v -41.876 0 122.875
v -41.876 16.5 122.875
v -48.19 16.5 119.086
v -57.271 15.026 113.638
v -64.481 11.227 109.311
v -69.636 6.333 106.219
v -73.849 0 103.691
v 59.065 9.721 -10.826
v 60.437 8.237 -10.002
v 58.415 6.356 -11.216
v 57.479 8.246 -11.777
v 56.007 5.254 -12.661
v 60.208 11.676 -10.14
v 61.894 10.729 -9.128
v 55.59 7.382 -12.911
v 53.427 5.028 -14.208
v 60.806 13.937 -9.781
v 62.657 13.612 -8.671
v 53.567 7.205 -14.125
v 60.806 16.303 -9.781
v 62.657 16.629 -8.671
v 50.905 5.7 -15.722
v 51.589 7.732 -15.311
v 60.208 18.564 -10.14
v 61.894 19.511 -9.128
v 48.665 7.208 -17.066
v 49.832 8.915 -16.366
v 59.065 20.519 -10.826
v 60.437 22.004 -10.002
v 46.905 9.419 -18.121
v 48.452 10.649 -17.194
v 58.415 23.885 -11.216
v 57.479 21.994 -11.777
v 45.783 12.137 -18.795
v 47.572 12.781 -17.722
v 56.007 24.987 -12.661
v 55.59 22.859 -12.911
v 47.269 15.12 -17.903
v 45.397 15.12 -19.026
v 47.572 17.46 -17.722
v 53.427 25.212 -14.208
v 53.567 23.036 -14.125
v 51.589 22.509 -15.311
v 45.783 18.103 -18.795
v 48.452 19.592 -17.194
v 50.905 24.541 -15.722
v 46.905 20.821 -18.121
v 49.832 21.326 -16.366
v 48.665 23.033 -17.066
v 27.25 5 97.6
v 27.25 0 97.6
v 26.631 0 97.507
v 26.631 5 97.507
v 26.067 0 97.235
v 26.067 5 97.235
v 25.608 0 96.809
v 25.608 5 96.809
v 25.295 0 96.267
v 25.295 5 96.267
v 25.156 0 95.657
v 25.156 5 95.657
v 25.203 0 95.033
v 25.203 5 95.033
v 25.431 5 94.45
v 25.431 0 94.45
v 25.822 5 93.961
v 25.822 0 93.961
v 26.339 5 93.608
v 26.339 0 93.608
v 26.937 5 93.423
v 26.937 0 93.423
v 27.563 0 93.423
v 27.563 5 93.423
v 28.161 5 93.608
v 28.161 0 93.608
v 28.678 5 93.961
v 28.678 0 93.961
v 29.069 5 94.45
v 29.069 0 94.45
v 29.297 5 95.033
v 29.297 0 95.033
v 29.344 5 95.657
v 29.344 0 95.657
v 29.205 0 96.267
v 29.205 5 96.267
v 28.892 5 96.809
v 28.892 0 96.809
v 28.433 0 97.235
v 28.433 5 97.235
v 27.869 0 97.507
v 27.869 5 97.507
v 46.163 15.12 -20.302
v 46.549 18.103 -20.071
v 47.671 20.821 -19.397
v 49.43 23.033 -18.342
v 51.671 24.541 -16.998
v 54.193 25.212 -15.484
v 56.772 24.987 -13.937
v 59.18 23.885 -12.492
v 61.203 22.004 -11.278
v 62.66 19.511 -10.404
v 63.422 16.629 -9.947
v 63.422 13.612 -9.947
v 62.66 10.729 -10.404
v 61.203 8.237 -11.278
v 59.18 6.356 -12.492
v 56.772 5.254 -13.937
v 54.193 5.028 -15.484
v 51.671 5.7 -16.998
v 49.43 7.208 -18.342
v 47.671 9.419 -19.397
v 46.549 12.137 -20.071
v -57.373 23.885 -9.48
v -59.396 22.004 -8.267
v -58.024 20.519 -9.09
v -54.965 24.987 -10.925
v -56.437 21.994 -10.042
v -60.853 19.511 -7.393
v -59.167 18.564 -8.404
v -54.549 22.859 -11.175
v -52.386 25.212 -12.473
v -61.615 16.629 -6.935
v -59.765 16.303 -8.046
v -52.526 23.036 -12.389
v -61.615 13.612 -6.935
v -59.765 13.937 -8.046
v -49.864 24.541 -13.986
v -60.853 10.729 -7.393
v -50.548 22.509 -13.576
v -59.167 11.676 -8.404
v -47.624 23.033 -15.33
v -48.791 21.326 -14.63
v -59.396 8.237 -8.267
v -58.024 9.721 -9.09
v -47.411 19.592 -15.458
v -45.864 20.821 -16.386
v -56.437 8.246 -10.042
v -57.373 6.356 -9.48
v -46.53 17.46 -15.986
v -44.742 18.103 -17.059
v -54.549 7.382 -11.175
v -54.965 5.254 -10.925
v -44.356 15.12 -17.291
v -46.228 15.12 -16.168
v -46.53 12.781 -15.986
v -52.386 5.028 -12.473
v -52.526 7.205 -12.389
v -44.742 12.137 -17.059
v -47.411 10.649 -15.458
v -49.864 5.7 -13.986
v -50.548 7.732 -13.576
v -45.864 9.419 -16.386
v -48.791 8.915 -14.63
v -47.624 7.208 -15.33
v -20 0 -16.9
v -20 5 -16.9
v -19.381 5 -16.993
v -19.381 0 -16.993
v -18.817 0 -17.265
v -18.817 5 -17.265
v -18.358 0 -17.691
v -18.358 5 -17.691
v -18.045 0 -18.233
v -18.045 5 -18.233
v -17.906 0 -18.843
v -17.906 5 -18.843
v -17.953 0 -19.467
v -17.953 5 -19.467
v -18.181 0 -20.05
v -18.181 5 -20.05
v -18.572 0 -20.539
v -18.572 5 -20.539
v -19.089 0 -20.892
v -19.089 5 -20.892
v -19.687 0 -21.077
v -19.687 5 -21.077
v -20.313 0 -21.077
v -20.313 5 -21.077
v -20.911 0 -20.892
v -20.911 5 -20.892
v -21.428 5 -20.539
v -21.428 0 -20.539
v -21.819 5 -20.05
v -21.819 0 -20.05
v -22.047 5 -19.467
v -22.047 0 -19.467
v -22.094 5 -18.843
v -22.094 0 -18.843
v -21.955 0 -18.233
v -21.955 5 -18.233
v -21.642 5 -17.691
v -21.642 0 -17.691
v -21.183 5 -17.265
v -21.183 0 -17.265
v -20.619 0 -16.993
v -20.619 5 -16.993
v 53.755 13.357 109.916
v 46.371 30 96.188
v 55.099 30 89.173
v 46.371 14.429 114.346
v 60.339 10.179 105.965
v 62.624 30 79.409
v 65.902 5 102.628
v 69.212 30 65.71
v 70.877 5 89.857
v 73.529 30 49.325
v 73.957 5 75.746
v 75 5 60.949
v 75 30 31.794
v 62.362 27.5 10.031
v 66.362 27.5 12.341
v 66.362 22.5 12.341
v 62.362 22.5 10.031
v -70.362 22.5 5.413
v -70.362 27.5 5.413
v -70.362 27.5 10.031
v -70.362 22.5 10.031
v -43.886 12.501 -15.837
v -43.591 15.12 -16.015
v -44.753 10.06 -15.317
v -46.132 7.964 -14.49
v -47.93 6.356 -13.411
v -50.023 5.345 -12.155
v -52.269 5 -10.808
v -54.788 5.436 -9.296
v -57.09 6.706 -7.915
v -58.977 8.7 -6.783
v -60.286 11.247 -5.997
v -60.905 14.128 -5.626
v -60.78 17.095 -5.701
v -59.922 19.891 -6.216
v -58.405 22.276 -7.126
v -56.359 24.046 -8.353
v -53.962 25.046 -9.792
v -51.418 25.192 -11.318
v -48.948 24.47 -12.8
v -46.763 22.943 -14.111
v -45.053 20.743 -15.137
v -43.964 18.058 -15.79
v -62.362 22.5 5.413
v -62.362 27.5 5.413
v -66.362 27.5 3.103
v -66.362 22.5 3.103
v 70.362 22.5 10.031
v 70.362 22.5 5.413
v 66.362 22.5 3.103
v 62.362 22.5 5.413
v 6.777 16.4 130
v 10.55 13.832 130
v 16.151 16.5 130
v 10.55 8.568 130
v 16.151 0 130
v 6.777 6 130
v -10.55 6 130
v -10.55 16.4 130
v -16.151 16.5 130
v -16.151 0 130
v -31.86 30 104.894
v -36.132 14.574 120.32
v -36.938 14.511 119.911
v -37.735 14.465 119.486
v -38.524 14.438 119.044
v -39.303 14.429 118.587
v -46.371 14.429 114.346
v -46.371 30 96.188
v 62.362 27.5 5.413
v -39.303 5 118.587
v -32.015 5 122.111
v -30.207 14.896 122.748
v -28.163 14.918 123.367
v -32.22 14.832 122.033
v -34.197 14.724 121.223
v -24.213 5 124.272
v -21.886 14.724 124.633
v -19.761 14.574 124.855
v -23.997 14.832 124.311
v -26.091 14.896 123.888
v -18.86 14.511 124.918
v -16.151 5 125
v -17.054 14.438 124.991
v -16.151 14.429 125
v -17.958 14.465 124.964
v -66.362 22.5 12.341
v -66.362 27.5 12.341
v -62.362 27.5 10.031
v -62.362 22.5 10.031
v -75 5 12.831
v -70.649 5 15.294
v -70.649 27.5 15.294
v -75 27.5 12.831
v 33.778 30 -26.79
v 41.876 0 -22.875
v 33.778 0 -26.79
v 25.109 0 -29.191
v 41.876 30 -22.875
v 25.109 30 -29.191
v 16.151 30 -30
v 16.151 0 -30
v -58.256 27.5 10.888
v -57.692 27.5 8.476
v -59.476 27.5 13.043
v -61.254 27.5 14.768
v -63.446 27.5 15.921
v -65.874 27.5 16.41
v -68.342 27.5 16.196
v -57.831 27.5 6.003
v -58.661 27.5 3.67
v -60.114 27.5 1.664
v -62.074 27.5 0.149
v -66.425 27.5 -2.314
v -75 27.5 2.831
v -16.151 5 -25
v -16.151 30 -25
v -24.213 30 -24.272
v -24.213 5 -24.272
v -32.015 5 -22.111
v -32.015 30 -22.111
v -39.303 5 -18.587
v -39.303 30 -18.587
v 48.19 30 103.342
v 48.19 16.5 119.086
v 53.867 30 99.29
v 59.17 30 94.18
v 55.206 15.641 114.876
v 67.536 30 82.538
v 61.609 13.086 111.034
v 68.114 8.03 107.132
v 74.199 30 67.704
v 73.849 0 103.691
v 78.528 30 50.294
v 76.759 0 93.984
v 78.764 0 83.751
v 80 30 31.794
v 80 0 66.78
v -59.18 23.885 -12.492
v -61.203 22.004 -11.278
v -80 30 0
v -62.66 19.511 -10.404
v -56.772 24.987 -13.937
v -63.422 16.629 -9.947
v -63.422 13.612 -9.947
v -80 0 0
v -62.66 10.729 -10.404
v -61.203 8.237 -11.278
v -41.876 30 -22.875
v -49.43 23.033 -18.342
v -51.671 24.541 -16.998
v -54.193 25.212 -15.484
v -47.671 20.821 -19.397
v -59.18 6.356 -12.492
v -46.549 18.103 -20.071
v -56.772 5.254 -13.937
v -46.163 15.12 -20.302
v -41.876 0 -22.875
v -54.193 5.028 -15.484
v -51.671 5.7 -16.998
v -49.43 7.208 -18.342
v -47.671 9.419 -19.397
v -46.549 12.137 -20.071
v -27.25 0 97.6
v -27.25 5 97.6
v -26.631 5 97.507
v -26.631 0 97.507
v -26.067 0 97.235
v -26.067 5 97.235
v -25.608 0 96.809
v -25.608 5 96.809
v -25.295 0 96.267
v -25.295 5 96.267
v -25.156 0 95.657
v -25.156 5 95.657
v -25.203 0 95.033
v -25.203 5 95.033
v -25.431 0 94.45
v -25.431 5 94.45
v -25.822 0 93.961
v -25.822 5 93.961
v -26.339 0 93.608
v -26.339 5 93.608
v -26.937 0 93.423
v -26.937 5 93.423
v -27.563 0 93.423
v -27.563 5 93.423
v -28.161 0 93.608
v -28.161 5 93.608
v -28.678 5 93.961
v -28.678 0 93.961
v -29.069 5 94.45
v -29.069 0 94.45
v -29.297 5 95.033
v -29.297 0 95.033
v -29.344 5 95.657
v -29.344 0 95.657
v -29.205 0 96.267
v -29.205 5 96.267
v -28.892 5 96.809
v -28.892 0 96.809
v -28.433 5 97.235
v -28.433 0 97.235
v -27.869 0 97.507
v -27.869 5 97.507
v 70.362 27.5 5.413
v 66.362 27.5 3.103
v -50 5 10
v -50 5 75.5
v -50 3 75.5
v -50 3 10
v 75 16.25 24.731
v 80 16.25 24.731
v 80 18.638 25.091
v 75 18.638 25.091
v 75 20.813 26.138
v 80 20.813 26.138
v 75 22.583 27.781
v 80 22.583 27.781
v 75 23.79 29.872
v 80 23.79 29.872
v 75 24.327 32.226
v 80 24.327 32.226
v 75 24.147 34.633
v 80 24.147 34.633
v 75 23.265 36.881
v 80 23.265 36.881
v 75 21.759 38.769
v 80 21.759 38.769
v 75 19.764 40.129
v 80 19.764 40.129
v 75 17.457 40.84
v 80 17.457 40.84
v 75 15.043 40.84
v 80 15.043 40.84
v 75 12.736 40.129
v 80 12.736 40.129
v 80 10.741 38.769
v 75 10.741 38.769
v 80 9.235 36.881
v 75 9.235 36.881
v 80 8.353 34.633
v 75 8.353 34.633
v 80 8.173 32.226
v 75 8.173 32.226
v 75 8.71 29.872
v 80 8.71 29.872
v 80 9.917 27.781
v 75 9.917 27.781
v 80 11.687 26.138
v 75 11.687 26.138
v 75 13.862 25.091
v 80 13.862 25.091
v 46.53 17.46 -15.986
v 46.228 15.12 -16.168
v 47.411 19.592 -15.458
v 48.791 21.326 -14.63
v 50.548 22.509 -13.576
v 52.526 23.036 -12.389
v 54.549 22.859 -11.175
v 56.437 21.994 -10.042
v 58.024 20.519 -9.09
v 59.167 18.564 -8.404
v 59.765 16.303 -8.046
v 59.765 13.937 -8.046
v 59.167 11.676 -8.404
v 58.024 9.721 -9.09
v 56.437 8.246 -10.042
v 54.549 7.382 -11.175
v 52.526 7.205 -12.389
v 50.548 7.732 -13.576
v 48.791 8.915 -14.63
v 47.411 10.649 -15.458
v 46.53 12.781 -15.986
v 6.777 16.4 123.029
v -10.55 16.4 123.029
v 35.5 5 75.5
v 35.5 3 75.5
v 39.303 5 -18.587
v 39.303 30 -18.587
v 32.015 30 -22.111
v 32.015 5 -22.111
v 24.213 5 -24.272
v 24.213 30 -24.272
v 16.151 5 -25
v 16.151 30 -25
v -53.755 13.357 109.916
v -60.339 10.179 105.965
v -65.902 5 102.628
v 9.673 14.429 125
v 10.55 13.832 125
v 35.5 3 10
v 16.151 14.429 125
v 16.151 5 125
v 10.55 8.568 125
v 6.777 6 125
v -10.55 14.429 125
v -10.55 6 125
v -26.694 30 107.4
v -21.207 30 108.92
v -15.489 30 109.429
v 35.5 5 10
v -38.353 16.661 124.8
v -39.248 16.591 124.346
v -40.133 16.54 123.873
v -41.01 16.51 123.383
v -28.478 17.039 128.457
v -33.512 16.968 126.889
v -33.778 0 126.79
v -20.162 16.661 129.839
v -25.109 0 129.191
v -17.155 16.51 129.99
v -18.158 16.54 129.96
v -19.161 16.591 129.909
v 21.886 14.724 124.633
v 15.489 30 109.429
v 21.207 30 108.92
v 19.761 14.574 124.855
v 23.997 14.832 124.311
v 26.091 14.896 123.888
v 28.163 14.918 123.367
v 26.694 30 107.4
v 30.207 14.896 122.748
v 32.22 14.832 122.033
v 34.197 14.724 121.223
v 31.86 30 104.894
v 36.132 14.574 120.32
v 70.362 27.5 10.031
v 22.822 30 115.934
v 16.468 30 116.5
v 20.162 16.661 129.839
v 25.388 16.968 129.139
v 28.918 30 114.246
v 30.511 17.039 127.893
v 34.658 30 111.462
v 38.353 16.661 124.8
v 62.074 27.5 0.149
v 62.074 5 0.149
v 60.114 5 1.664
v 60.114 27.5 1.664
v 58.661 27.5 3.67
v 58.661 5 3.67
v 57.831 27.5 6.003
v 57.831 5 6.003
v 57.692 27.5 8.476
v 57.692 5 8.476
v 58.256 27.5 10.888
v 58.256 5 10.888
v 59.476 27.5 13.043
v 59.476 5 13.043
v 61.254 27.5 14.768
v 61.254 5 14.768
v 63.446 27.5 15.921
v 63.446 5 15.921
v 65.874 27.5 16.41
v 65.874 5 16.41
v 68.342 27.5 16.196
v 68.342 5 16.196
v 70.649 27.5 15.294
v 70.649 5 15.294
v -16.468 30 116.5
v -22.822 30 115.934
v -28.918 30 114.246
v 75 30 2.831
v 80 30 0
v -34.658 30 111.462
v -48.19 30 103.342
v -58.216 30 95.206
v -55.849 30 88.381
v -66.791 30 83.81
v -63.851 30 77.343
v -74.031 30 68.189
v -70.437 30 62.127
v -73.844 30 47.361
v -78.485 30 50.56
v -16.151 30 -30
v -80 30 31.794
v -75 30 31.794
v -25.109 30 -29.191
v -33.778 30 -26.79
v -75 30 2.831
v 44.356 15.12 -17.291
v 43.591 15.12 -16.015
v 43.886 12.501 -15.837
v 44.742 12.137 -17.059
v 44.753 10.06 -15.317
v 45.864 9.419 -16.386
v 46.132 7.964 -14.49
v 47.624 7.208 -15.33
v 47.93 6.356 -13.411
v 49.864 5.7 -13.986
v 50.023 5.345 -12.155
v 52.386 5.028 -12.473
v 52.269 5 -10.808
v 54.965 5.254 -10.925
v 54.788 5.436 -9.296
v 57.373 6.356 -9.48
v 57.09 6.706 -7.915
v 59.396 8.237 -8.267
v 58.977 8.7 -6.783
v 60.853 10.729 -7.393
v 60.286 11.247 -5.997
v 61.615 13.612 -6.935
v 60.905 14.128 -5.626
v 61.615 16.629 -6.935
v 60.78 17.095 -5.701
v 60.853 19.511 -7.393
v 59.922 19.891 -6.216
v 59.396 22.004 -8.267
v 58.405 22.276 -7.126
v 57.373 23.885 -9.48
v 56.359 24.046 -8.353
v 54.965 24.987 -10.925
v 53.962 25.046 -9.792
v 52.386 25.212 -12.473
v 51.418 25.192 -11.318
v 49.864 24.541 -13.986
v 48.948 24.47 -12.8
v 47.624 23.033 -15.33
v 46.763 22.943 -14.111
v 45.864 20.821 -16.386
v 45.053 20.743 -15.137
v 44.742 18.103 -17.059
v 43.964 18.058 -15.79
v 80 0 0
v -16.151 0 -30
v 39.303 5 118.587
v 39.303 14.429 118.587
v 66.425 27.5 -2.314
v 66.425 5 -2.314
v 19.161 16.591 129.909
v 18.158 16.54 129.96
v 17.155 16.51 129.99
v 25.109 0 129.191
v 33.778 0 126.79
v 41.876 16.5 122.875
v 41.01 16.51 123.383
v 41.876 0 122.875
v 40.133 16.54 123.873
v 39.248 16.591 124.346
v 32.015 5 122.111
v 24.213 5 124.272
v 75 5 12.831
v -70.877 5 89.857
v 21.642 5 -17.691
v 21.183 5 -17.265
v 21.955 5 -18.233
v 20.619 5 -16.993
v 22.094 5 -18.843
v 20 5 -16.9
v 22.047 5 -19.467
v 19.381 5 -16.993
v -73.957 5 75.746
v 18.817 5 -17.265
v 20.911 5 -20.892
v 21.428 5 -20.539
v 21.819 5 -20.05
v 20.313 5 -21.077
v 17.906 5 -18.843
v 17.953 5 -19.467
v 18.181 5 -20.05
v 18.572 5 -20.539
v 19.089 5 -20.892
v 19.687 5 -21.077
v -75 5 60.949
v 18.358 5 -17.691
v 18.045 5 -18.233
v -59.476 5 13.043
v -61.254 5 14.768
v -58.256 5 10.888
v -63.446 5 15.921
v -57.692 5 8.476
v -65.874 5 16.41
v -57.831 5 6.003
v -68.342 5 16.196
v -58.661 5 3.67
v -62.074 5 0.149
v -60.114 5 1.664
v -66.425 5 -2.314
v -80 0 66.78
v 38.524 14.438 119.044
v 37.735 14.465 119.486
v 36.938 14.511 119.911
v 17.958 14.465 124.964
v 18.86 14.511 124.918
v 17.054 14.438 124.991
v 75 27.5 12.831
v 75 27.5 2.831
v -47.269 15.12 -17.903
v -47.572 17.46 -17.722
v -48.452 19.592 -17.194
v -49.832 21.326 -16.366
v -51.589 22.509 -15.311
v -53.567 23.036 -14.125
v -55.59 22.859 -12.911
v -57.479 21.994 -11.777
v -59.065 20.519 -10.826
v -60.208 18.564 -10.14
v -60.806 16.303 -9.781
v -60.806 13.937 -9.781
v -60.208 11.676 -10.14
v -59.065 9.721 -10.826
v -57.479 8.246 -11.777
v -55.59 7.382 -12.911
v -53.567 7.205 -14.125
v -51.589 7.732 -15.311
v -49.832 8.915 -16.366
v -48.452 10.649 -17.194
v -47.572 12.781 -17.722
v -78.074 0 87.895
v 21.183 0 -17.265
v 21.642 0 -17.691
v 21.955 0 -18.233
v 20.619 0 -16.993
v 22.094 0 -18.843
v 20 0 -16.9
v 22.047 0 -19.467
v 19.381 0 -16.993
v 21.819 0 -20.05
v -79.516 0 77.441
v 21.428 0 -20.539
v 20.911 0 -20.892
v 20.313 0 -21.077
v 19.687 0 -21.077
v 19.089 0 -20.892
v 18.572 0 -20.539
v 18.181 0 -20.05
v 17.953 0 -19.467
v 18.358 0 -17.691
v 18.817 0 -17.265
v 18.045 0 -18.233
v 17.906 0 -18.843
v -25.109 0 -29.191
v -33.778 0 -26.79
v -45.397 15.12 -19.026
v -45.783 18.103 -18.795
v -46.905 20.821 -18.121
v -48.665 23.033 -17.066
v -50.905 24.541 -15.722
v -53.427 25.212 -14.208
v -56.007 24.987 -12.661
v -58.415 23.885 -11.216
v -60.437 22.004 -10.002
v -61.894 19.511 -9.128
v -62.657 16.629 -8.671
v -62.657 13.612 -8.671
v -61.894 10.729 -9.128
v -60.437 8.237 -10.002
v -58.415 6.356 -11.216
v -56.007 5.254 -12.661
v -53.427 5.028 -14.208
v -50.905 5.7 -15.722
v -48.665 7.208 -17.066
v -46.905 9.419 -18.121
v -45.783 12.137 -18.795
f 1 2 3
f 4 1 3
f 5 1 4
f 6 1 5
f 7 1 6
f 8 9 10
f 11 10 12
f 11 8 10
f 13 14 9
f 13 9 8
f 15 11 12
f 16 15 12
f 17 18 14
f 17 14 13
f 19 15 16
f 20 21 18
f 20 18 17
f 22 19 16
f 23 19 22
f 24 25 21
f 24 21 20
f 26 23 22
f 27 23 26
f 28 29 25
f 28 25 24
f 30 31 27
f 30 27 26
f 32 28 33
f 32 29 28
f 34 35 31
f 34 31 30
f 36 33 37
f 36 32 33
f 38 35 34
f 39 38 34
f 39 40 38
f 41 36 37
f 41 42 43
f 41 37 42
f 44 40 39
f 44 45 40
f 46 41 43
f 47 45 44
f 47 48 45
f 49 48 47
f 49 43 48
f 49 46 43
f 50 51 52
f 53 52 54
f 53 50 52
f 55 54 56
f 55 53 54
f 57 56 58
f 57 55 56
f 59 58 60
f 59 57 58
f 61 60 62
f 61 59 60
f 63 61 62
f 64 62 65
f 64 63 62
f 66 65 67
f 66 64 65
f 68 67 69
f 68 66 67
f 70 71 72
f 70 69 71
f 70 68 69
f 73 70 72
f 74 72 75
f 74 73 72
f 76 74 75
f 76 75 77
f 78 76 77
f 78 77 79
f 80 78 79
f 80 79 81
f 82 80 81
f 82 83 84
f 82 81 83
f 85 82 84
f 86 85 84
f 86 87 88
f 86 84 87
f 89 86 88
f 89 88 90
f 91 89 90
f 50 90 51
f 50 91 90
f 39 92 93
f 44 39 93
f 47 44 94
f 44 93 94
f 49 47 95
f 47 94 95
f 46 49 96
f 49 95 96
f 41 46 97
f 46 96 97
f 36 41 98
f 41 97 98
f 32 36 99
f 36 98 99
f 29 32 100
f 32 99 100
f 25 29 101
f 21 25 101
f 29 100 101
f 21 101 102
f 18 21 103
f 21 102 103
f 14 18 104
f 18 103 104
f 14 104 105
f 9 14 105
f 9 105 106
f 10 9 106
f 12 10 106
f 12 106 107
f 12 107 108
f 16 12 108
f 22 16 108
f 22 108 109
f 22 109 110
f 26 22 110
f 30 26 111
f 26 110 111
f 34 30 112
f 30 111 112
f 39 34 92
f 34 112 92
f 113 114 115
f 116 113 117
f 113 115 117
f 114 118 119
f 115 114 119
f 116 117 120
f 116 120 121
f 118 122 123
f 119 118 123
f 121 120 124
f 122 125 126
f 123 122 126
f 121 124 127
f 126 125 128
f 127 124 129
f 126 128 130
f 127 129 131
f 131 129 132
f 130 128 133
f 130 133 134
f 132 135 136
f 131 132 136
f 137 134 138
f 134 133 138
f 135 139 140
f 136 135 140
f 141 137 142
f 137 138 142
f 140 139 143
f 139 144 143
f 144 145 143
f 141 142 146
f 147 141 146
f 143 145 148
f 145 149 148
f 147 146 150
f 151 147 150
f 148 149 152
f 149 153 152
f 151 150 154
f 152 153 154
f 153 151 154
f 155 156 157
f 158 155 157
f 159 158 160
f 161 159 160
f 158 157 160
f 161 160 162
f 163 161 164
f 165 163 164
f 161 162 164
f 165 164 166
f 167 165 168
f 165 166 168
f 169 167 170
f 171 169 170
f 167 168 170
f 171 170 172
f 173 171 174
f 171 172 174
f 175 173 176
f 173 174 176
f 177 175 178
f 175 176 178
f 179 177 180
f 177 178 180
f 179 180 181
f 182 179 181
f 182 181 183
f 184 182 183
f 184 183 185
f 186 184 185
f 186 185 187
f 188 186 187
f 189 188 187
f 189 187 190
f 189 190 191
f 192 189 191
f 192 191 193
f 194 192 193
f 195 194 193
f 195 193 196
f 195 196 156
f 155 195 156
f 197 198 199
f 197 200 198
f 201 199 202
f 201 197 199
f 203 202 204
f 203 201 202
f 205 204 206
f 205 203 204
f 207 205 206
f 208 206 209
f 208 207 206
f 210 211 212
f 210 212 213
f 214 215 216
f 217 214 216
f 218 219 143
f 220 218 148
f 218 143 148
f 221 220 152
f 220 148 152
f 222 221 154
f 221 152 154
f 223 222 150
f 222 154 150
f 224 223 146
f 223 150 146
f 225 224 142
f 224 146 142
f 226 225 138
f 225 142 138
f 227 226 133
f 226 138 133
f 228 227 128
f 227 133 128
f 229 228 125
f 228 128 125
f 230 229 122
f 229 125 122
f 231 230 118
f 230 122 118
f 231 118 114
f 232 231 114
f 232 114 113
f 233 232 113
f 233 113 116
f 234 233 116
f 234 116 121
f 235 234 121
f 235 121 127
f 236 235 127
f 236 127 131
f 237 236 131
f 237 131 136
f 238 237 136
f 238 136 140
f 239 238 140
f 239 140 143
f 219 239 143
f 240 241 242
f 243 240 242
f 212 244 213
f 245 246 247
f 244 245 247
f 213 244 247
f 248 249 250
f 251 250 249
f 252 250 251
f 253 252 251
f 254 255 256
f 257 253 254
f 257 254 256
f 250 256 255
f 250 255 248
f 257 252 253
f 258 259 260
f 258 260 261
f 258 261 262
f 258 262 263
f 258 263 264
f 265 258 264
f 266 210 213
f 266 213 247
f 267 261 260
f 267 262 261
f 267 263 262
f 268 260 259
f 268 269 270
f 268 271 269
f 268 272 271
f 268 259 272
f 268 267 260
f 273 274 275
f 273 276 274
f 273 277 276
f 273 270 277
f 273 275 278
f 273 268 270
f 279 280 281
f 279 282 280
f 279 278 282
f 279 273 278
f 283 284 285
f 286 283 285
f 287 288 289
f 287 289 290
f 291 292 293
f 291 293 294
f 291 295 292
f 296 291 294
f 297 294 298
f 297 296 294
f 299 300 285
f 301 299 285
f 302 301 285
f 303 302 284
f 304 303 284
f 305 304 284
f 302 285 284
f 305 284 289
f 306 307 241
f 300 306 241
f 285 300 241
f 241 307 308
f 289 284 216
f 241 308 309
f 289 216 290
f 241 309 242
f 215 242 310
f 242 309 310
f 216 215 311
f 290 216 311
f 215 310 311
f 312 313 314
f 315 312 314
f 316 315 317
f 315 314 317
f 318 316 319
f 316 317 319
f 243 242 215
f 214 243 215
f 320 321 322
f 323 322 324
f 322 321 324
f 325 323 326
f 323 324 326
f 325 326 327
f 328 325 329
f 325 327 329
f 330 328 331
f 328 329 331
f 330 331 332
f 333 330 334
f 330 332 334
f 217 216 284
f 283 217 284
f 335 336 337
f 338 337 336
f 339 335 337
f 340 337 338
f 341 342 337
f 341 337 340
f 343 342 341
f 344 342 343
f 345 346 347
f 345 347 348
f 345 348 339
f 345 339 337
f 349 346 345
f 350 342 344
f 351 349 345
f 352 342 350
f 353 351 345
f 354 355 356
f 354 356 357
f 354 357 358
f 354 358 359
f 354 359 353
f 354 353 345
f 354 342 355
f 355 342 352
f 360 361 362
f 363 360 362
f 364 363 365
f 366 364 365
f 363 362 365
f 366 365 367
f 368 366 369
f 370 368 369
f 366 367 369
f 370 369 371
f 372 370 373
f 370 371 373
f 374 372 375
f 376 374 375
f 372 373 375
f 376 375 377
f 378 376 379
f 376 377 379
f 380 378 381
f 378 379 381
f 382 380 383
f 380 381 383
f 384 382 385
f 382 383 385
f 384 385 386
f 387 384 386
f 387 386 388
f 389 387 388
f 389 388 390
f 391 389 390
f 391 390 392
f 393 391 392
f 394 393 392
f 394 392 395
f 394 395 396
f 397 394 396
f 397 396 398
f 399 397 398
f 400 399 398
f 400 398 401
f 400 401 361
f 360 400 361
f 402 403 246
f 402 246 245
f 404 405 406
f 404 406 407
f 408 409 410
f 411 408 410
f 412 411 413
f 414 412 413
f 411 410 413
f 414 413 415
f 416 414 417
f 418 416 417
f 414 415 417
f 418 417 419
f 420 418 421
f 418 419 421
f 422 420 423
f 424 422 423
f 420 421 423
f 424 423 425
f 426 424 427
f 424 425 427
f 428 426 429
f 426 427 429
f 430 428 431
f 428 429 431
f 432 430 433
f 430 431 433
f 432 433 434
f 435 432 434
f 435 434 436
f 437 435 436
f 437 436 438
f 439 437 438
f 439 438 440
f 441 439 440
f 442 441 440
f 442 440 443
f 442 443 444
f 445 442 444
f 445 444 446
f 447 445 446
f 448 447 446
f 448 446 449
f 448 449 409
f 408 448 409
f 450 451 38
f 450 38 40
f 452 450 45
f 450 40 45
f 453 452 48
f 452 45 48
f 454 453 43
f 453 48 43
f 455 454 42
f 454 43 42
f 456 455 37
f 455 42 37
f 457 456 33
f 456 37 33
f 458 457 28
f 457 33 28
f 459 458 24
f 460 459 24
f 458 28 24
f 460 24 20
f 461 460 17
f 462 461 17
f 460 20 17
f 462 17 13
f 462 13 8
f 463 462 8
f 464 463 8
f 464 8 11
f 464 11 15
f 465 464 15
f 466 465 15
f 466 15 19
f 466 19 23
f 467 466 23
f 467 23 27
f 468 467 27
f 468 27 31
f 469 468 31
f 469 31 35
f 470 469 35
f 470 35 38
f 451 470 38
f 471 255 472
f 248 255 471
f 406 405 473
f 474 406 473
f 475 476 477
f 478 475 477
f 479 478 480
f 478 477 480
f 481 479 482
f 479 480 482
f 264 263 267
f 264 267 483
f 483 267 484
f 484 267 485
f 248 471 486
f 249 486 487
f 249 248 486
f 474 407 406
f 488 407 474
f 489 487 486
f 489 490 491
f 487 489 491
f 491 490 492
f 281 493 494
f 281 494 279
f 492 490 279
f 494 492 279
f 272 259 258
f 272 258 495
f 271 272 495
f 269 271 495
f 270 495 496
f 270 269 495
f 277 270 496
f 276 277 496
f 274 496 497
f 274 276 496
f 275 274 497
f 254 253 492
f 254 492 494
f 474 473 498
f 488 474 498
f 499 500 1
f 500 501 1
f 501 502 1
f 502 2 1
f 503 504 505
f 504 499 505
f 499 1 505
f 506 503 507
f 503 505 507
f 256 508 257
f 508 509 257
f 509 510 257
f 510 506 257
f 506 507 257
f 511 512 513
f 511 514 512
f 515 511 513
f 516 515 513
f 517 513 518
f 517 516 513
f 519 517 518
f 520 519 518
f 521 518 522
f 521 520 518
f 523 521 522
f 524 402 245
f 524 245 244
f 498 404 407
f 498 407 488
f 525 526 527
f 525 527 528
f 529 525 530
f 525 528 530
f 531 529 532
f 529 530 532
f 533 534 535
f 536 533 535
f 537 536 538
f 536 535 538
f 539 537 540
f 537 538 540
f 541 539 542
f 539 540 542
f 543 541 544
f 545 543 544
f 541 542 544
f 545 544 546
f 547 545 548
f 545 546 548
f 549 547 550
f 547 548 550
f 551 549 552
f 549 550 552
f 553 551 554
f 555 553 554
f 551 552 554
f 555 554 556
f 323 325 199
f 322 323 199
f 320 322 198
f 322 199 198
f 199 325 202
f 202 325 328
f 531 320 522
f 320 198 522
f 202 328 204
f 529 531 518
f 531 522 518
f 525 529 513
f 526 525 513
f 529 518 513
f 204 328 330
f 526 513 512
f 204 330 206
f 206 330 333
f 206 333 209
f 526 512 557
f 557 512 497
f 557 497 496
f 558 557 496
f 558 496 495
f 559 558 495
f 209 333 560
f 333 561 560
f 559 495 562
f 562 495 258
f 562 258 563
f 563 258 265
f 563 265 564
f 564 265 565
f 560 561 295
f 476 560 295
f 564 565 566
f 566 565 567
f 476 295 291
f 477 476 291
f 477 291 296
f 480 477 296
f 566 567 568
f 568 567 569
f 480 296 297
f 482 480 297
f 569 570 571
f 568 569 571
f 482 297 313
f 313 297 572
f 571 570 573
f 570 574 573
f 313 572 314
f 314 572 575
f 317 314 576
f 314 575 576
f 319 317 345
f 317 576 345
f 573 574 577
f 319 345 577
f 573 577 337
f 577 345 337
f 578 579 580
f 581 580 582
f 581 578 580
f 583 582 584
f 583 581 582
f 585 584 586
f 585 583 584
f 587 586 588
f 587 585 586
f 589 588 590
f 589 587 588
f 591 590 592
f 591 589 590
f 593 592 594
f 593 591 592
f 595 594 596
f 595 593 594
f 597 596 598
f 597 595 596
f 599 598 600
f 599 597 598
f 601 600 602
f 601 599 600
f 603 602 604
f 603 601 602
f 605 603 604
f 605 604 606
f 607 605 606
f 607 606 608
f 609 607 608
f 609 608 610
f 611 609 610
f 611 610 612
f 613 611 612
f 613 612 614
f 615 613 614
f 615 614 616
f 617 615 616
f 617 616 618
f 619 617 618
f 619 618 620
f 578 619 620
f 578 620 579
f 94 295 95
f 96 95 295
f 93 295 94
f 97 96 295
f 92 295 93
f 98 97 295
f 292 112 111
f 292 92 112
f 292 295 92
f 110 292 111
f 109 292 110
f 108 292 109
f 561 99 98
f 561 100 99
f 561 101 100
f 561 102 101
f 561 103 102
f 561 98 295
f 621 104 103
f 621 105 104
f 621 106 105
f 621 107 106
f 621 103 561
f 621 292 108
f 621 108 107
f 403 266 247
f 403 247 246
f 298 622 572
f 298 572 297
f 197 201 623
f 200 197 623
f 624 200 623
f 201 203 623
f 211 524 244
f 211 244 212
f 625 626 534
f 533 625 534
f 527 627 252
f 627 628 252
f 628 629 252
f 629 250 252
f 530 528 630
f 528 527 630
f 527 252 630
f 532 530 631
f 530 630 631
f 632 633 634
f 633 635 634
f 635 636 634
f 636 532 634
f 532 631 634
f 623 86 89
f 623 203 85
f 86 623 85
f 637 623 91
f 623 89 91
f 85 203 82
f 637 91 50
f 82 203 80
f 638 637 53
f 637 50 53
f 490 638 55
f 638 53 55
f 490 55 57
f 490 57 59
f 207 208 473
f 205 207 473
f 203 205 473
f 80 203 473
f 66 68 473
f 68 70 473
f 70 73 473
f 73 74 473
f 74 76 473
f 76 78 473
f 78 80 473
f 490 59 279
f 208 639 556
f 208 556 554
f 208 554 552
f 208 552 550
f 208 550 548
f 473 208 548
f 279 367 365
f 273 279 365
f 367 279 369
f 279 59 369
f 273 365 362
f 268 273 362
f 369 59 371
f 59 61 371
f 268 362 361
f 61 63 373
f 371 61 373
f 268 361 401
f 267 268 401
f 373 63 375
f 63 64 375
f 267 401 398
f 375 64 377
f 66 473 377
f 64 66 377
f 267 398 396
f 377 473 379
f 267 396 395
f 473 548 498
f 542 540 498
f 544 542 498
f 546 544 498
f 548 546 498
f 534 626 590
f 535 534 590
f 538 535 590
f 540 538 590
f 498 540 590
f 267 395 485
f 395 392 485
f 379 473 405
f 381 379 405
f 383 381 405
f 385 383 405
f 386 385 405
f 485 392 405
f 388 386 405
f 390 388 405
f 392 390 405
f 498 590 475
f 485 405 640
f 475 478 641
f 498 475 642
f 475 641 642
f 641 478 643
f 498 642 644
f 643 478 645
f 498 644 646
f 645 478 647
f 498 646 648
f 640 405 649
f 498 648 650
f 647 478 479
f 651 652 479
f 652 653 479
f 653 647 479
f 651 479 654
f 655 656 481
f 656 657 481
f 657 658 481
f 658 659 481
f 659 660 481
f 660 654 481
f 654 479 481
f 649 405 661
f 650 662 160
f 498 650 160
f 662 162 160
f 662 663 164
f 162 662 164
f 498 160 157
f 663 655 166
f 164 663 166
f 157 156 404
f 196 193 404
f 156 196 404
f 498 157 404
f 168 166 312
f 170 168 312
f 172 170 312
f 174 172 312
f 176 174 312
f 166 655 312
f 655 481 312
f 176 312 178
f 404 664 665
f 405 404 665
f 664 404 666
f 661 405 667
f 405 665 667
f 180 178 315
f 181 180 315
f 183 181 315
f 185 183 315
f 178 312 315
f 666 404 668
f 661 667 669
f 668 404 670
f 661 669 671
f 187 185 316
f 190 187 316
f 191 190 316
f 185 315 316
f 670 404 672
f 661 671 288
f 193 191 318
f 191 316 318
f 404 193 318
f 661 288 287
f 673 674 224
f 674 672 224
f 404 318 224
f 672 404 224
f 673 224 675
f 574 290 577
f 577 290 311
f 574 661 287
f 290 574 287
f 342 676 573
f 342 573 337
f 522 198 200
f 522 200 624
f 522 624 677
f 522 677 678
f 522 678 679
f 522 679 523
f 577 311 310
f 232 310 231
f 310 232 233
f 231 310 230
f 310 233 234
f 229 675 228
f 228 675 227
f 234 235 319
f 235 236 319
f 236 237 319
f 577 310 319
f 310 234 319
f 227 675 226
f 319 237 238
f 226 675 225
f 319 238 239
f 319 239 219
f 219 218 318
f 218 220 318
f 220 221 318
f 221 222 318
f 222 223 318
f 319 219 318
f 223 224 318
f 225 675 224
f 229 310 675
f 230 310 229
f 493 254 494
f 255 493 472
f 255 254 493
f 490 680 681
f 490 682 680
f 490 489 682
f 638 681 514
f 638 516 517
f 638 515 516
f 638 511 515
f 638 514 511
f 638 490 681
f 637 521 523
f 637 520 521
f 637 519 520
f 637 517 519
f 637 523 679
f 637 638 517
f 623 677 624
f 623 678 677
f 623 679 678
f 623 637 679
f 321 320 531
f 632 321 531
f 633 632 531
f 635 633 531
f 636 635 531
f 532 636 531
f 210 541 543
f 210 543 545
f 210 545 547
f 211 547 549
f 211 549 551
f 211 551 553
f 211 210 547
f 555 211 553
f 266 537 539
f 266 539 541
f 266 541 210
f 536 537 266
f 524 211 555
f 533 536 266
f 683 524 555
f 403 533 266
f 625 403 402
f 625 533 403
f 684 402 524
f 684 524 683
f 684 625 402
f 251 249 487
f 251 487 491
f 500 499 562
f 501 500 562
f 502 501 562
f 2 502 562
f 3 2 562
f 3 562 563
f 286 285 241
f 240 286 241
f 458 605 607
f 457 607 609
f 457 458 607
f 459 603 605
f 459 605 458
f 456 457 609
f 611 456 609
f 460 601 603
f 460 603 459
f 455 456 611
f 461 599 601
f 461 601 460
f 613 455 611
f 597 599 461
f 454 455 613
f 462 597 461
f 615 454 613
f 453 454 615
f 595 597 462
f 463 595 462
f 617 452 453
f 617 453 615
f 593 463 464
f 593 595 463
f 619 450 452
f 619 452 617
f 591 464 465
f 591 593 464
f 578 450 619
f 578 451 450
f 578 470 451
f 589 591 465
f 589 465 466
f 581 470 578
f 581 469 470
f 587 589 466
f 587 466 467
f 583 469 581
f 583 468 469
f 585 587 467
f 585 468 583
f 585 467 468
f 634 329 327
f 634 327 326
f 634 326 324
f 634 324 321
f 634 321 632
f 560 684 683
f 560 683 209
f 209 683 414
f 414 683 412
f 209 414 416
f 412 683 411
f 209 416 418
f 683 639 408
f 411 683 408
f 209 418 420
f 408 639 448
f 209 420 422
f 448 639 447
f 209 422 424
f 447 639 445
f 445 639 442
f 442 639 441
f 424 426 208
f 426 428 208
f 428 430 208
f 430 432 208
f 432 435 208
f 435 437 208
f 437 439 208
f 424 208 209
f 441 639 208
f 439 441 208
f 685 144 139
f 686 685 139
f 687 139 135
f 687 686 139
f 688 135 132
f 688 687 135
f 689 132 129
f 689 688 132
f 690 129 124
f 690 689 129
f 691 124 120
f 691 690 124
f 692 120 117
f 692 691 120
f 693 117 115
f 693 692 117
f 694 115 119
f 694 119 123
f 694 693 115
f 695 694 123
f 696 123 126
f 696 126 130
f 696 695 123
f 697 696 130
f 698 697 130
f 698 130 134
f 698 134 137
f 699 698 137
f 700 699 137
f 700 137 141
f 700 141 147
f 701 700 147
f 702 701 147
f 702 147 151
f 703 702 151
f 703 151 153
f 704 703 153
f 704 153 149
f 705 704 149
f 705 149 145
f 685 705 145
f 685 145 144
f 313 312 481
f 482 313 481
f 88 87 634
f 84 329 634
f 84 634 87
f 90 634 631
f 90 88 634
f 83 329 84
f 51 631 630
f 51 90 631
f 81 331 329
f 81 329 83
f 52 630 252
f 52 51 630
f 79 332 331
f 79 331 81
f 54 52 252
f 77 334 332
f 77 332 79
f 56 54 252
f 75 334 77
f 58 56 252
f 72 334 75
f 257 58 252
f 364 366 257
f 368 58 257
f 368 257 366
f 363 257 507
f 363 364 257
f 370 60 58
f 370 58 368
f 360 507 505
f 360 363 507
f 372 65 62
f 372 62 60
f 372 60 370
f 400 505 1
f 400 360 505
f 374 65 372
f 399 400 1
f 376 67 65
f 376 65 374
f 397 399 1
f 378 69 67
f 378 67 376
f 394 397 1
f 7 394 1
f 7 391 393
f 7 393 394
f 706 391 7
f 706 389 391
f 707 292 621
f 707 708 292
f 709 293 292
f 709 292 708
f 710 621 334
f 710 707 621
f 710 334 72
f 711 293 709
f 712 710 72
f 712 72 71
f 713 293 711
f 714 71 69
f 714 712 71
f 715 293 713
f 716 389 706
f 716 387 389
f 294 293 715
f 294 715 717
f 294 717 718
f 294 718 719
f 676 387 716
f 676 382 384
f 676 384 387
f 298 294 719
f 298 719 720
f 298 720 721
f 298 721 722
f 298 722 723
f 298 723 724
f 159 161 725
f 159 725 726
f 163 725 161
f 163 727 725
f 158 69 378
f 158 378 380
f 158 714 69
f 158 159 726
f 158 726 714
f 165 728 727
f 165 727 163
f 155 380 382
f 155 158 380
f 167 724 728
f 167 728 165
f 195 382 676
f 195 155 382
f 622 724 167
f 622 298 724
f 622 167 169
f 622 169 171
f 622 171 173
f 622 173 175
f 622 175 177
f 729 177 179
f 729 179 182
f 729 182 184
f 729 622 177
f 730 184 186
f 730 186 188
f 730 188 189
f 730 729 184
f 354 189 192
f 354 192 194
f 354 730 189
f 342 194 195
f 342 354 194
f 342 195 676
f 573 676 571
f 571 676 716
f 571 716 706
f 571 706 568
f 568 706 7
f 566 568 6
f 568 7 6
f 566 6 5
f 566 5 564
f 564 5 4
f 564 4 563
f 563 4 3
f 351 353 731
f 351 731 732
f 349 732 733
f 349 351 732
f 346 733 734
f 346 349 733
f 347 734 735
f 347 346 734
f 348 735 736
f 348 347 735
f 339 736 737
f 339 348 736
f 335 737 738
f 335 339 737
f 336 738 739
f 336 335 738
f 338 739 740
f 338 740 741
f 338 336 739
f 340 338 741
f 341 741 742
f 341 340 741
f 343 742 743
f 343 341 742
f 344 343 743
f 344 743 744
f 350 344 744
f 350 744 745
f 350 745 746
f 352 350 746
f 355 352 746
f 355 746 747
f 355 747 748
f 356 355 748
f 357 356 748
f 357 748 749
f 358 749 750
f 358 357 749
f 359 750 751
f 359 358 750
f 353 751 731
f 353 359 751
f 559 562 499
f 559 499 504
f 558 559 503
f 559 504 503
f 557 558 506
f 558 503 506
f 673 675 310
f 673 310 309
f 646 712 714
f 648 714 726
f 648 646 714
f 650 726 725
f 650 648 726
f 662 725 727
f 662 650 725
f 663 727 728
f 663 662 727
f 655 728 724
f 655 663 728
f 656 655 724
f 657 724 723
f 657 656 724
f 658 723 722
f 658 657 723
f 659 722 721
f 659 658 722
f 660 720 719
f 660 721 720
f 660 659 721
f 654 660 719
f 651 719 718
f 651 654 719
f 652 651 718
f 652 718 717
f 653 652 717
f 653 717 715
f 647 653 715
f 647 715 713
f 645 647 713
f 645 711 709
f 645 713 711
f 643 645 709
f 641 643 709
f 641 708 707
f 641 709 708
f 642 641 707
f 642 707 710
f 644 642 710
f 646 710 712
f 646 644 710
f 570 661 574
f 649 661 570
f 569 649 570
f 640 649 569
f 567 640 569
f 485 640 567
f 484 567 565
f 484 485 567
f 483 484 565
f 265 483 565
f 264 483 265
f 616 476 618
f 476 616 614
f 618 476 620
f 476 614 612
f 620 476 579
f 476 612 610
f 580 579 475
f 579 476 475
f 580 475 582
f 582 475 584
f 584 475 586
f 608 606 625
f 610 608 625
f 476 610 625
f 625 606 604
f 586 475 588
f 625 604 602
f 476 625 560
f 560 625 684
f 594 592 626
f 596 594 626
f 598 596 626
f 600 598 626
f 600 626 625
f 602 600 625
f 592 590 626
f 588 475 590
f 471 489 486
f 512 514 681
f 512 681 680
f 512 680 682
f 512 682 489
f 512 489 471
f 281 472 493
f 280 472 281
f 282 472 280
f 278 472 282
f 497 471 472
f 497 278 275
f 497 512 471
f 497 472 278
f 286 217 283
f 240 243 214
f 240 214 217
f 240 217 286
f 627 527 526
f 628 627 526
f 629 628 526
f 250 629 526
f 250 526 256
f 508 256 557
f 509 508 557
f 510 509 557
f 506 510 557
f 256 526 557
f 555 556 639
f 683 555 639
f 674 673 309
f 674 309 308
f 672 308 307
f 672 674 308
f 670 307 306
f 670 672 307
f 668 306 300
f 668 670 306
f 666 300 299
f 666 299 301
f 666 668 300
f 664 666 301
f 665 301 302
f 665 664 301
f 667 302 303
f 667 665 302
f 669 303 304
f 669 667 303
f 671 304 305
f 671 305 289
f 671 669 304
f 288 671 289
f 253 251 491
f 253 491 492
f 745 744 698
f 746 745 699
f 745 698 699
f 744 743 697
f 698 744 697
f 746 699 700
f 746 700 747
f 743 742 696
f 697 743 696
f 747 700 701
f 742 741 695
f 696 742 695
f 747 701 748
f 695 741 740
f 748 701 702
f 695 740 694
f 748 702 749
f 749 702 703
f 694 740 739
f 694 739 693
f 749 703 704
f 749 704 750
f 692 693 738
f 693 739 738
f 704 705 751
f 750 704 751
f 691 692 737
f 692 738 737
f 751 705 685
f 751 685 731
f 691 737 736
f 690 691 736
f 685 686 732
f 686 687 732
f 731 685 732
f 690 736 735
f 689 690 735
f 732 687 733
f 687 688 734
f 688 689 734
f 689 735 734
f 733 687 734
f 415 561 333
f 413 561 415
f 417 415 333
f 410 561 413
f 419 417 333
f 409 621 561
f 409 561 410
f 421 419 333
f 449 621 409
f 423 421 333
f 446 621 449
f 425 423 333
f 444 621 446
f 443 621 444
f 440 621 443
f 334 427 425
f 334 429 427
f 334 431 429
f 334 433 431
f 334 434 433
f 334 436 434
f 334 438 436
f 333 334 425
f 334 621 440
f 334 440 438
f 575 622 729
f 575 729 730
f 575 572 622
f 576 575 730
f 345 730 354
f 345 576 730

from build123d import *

# Parameters (mm, degrees)
BOSS_EXTRUDE1_DEPTH = 30
CHAMFER1_SIZE       = 13.5
FILLET1_R           = 50
FILLET2_R           = 50
SHELL1_T            = -5
CUT_EXTRUDE1_REACH  = 183.384
SKETCH5_W           = 85.5
SKETCH5_H           = 65.5
CUT_EXTRUDE2_DEPTH  = 2
SKETCH6_R           = 10.1203125
CUT_EXTRUDE3_DEPTH  = 1.488
CUT_EXTRUDE4_START  = -1.488
SKETCH7_R           = 10.1203125
CUT_EXTRUDE4_DEPTH  = 1.488
CUT_EXTRUDE5_REACH  = 198.109
SKETCH8_R           = 7.9375
BOSS_EXTRUDE2_START = -25
BOSS_EXTRUDE2_DEPTH = 22.5
CUT_EXTRUDE6_START  = -2.5
CUT_EXTRUDE6_DEPTH  = 5
SKETCH11_R          = 2.1
CUT_EXTRUDE7_DEPTH  = 155.677082983
CUT_EXTRUDE8_REACH  = 210.327
SKETCH12_R          = 8.1


with BuildPart() as part:
    # Sketch3 → Boss-Extrude1 (new body)
    with BuildSketch(Plane(origin=(0, 0, 0), x_dir=(1, 0, 0), z_dir=(0, 1, 0))):
        Polygon((80, 0), (80, -100), (30, -130), (-30, -130), (-80, -100), (-80, 0), (-30, 30), (30, 30), align=None)
    extrude(amount=BOSS_EXTRUDE1_DEPTH)

    # Chamfer1
    chamfer1_edges = [part.edges().sort_by_distance(p)[0] for p in [
        (-55, 30, 115),
        (0, 30, 130),
        (55, 30, 115),
    ]]
    chamfer(chamfer1_edges, length=CHAMFER1_SIZE)

    # Fillet1
    # the kernel refuses this fillet: 50 mm, written as the material it takes off along each edge
    with BuildSketch(Plane(origin=(30, -34.622995619, 130), x_dir=(0.857492925712544, 0, -0.5144957554275268), z_dir=(0, 1, 0)), Plane(origin=(-30, -34.622995619, 130), x_dir=(1, 0, 0), z_dir=(0, 1, 0))) as fillet1_piece_1:
        with BuildLine():
            CenterArc((FILLET1_R * 0.276983964948, FILLET1_R), FILLET1_R, 239.036243468, 30.963756532)
            Line((-FILLET1_R * 0.237511790479, FILLET1_R * 0.142507074287), (0, 0))
            Line((0, 0), (FILLET1_R * 0.276983964948, 0))
        make_face()
    extrude(amount=85.745991237, mode=Mode.SUBTRACT)
    with BuildSketch(Plane(origin=(-80, -39.074271729, 164.810181009), x_dir=(0, -0.759125277171481, -0.6509445549041194), z_dir=(0, 0.6509445549041194, -0.759125277171481))) as fillet1_piece_2:
        with BuildLine():
            CenterArc((FILLET1_R * 0.682998529574, -FILLET1_R), FILLET1_R, 90, 68.666037253)
            Line((-FILLET1_R * 0.248477212904, -FILLET1_R * 0.636196562446), (0, 0))
            Line((0, 0), (FILLET1_R * 0.682998529574, 0))
        make_face()
    extrude(amount=191.488725913, mode=Mode.SUBTRACT)
    with BuildSketch(Plane(origin=(80, -39.074271729, 164.810181009), x_dir=(0, -0.759125277171481, -0.6509445549041195), z_dir=(0, 0.6509445549041195, -0.759125277171481))) as fillet1_piece_3:
        with BuildLine():
            CenterArc((FILLET1_R * 0.682998529574, FILLET1_R), FILLET1_R, 201.333962747, 68.666037253)
            Line((-FILLET1_R * 0.248477212904, FILLET1_R * 0.636196562446), (0, 0))
            Line((0, 0), (FILLET1_R * 0.682998529574, 0))
        make_face()
    extrude(amount=191.488725913, mode=Mode.SUBTRACT)
    with BuildSketch(Plane(origin=(34.617865704, -0.171960433, 146.671960433), x_dir=(0.9114297192816029, -0.13590975982943138, -0.3883611772478869), z_dir=(-0.19220542560964893, 0.6939225729021263, -0.6939225729021263)), Plane(origin=(-34.617865704, -0.171960433, 146.671960433), x_dir=(0.9813547138350198, -0.13590975982942916, 0.13590975982942954), z_dir=(0.19220542560964907, 0.6939225729021263, -0.6939225729021263))) as fillet1_piece_4:
        with BuildLine():
            CenterArc((FILLET1_R * 0.19220542561, FILLET1_R), FILLET1_R, 248.24024707, 21.75975293)
            Line((-FILLET1_R * 0.178510109177, FILLET1_R * 0.0712535371437), (0, 0))
            Line((0, 0), (FILLET1_R * 0.19220542561, 0))
        make_face()
    extrude(amount=67.505976453, mode=Mode.SUBTRACT)

    # Fillet2
    fillet2_edges = [part.edges().sort_by_distance(p)[0] for p in [
        (30, 15, -30),
        (-30, 15, -30),
    ]]
    fillet(fillet2_edges, radius=FILLET2_R)

    # Shell1
    shell1_openings = [part.faces().sort_by_distance(p)[0] for p in [
        (0, 30, 41.507073617),
    ]]
    offset(amount=SHELL1_T, openings=shell1_openings)

    # Sketch4 → Cut-Extrude1 (cut, up to next)
    with BuildSketch(Plane.XY.offset(130), mode=Mode.PRIVATE) as cut_extrude1_sk1:
        Polygon((10.55, 13.832263561), (10.55, 8.567736439), (6.776999518, 6), (-10.55, 6), (-10.55, 16.4), (6.776999518, 16.4), align=None)
    cut_extrude1_tool1 = extrude(cut_extrude1_sk1.sketch, amount=-CUT_EXTRUDE1_REACH, mode=Mode.PRIVATE) & part.part
    add(cut_extrude1_tool1.solids().sort_by_distance((-0.429196, 11.2, 130))[0], mode=Mode.SUBTRACT)

    # Sketch5 → Cut-Extrude2 (cut)
    with BuildSketch(Plane(origin=(0, 5, 0), x_dir=(1, 0, 0), z_dir=(0, 1, 0))):
        with Locations((-7.25, -42.75)):
            Rectangle(SKETCH5_W, SKETCH5_H)
    extrude(amount=-CUT_EXTRUDE2_DEPTH, mode=Mode.SUBTRACT)

    # Sketch6 → Cut-Extrude3 (cut)
    with BuildSketch(Plane(origin=(21.176470588, 0, -35.294117647), x_dir=(-0.8574929257125442, 0, -0.5144957554275265), z_dir=(0.5144957554275265, 0, -0.8574929257125442))):
        with Locations((-39.259425856, 15.1203125)):
            Circle(SKETCH6_R)
    cut_extrude3 = extrude(amount=-CUT_EXTRUDE3_DEPTH, mode=Mode.SUBTRACT)

    # Sketch7 → Cut-Extrude4 (cut)
    with BuildSketch(Plane(origin=(18.603991811, 0, -31.006653018), x_dir=(0.8574929257125442, 0, 0.5144957554275265), z_dir=(-0.5144957554275265, 0, 0.8574929257125442)).offset(CUT_EXTRUDE4_START)):
        with Locations(Location((39.259425856, 15.1203125, 0), (0, 0, 180))):
            Circle(SKETCH7_R)
    cut_extrude4 = extrude(amount=CUT_EXTRUDE4_DEPTH, mode=Mode.SUBTRACT)

    # Sketch8 → Cut-Extrude5 (cut, up to next)
    with BuildSketch(Plane(origin=(21.176470588, 0, -35.294117647), x_dir=(-0.8574929257125442, 0, -0.5144957554275265), z_dir=(0.5144957554275265, 0, -0.8574929257125442)), mode=Mode.PRIVATE) as cut_extrude5_sk1:
        with Locations((-39.259425856, 15.1203125)):
            Circle(SKETCH8_R)
    cut_extrude5_tool1 = extrude(cut_extrude5_sk1.sketch, amount=-CUT_EXTRUDE5_REACH, mode=Mode.PRIVATE) & part.part
    cut_extrude5 = cut_extrude5_tool1.solids().sort_by_distance((54.841151, 15.120313, -15.09531))[0]
    add(cut_extrude5, mode=Mode.SUBTRACT)

    # Mirror1: Cut-Extrude3, Cut-Extrude4, Cut-Extrude5 across plane
    add(cut_extrude3.mirror(Plane(origin=(0, 0, 0), x_dir=(0, 0, 1), z_dir=(1, 0, 0))), mode=Mode.SUBTRACT)
    add(cut_extrude4.mirror(Plane(origin=(0, 0, 0), x_dir=(0, 0, 1), z_dir=(1, 0, 0))), mode=Mode.SUBTRACT)
    add(cut_extrude5.mirror(Plane(origin=(0, 0, 0), x_dir=(0, 0, 1), z_dir=(1, 0, 0))), mode=Mode.SUBTRACT)

    # Sketch9 → Boss-Extrude2 (add)
    with BuildSketch(Plane(origin=(0, 30, 0), x_dir=(1, 0, 0), z_dir=(0, 1, 0)).offset(BOSS_EXTRUDE2_START)):
        with BuildLine():
            Line((-75, -2.830951895), (-66.425070743, 2.314005659))
            Line((-66.425070743, 2.314005659), (-62.074071209, -0.149488415))
            ThreePointArc((-62.074071209, -0.149488415), (-58.789057061, -12.009431821), (-70.649000466, -15.29444597))
            Line((-70.649000466, -15.29444597), (-75, -12.830951895))
            Line((-75, -12.830951895), (-75, -2.830951895))
        make_face()
    boss_extrude2 = extrude(amount=BOSS_EXTRUDE2_DEPTH)

    # Sketch10 → Cut-Extrude6 (cut)
    with BuildSketch(Plane(origin=(0, 30, 0), x_dir=(1, 0, 0), z_dir=(0, 1, 0)).offset(CUT_EXTRUDE6_START)):
        Polygon((-62.361535838, -5.412566116), (-66.361535838, -3.103165039), (-70.361535838, -5.412566116), (-70.361535838, -10.031368269), (-66.361535838, -12.340769346), (-62.361535838, -10.031368269), align=None)
    cut_extrude6 = extrude(amount=-CUT_EXTRUDE6_DEPTH, mode=Mode.SUBTRACT)

    # Mirror2: Boss-Extrude2, Cut-Extrude6 across plane
    add(boss_extrude2.mirror(Plane(origin=(0, 0, 0), x_dir=(0, 0, 1), z_dir=(1, 0, 0))))
    add(cut_extrude6.mirror(Plane(origin=(0, 0, 0), x_dir=(0, 0, 1), z_dir=(1, 0, 0))), mode=Mode.SUBTRACT)

    # Sketch11 → Cut-Extrude7 (cut, through all)
    with BuildSketch(Plane(origin=(0, 5, 0), x_dir=(1, 0, 0), z_dir=(0, 1, 0))):
        with Locations(Location((-27.25, -95.5, 0), (0, 0, 270))):
            Circle(SKETCH11_R)
        with Locations(Location((-20, 19, 0), (0, 0, 270))):
            Circle(SKETCH11_R)
    cut_extrude7 = extrude(amount=-CUT_EXTRUDE7_DEPTH, mode=Mode.SUBTRACT)

    # Mirror3: Cut-Extrude7 across plane
    add(cut_extrude7.mirror(Plane(origin=(0, 0, 0), x_dir=(0, 0, 1), z_dir=(1, 0, 0))), mode=Mode.SUBTRACT)

    # Sketch12 → Cut-Extrude8 (cut, up to next)
    with BuildSketch(Plane(origin=(80, 0, 0), x_dir=(0, 0, -1), z_dir=(1, 0, 0)), mode=Mode.PRIVATE) as cut_extrude8_sk1:
        with Locations((-32.830951895, 16.25)):
            Circle(SKETCH12_R)
    cut_extrude8_tool1 = extrude(cut_extrude8_sk1.sketch, amount=-CUT_EXTRUDE8_REACH, mode=Mode.PRIVATE) & part.part
    add(cut_extrude8_tool1.solids().sort_by_distance((80, 16.25, 32.830952))[0], mode=Mode.SUBTRACT)


solid = part.part
